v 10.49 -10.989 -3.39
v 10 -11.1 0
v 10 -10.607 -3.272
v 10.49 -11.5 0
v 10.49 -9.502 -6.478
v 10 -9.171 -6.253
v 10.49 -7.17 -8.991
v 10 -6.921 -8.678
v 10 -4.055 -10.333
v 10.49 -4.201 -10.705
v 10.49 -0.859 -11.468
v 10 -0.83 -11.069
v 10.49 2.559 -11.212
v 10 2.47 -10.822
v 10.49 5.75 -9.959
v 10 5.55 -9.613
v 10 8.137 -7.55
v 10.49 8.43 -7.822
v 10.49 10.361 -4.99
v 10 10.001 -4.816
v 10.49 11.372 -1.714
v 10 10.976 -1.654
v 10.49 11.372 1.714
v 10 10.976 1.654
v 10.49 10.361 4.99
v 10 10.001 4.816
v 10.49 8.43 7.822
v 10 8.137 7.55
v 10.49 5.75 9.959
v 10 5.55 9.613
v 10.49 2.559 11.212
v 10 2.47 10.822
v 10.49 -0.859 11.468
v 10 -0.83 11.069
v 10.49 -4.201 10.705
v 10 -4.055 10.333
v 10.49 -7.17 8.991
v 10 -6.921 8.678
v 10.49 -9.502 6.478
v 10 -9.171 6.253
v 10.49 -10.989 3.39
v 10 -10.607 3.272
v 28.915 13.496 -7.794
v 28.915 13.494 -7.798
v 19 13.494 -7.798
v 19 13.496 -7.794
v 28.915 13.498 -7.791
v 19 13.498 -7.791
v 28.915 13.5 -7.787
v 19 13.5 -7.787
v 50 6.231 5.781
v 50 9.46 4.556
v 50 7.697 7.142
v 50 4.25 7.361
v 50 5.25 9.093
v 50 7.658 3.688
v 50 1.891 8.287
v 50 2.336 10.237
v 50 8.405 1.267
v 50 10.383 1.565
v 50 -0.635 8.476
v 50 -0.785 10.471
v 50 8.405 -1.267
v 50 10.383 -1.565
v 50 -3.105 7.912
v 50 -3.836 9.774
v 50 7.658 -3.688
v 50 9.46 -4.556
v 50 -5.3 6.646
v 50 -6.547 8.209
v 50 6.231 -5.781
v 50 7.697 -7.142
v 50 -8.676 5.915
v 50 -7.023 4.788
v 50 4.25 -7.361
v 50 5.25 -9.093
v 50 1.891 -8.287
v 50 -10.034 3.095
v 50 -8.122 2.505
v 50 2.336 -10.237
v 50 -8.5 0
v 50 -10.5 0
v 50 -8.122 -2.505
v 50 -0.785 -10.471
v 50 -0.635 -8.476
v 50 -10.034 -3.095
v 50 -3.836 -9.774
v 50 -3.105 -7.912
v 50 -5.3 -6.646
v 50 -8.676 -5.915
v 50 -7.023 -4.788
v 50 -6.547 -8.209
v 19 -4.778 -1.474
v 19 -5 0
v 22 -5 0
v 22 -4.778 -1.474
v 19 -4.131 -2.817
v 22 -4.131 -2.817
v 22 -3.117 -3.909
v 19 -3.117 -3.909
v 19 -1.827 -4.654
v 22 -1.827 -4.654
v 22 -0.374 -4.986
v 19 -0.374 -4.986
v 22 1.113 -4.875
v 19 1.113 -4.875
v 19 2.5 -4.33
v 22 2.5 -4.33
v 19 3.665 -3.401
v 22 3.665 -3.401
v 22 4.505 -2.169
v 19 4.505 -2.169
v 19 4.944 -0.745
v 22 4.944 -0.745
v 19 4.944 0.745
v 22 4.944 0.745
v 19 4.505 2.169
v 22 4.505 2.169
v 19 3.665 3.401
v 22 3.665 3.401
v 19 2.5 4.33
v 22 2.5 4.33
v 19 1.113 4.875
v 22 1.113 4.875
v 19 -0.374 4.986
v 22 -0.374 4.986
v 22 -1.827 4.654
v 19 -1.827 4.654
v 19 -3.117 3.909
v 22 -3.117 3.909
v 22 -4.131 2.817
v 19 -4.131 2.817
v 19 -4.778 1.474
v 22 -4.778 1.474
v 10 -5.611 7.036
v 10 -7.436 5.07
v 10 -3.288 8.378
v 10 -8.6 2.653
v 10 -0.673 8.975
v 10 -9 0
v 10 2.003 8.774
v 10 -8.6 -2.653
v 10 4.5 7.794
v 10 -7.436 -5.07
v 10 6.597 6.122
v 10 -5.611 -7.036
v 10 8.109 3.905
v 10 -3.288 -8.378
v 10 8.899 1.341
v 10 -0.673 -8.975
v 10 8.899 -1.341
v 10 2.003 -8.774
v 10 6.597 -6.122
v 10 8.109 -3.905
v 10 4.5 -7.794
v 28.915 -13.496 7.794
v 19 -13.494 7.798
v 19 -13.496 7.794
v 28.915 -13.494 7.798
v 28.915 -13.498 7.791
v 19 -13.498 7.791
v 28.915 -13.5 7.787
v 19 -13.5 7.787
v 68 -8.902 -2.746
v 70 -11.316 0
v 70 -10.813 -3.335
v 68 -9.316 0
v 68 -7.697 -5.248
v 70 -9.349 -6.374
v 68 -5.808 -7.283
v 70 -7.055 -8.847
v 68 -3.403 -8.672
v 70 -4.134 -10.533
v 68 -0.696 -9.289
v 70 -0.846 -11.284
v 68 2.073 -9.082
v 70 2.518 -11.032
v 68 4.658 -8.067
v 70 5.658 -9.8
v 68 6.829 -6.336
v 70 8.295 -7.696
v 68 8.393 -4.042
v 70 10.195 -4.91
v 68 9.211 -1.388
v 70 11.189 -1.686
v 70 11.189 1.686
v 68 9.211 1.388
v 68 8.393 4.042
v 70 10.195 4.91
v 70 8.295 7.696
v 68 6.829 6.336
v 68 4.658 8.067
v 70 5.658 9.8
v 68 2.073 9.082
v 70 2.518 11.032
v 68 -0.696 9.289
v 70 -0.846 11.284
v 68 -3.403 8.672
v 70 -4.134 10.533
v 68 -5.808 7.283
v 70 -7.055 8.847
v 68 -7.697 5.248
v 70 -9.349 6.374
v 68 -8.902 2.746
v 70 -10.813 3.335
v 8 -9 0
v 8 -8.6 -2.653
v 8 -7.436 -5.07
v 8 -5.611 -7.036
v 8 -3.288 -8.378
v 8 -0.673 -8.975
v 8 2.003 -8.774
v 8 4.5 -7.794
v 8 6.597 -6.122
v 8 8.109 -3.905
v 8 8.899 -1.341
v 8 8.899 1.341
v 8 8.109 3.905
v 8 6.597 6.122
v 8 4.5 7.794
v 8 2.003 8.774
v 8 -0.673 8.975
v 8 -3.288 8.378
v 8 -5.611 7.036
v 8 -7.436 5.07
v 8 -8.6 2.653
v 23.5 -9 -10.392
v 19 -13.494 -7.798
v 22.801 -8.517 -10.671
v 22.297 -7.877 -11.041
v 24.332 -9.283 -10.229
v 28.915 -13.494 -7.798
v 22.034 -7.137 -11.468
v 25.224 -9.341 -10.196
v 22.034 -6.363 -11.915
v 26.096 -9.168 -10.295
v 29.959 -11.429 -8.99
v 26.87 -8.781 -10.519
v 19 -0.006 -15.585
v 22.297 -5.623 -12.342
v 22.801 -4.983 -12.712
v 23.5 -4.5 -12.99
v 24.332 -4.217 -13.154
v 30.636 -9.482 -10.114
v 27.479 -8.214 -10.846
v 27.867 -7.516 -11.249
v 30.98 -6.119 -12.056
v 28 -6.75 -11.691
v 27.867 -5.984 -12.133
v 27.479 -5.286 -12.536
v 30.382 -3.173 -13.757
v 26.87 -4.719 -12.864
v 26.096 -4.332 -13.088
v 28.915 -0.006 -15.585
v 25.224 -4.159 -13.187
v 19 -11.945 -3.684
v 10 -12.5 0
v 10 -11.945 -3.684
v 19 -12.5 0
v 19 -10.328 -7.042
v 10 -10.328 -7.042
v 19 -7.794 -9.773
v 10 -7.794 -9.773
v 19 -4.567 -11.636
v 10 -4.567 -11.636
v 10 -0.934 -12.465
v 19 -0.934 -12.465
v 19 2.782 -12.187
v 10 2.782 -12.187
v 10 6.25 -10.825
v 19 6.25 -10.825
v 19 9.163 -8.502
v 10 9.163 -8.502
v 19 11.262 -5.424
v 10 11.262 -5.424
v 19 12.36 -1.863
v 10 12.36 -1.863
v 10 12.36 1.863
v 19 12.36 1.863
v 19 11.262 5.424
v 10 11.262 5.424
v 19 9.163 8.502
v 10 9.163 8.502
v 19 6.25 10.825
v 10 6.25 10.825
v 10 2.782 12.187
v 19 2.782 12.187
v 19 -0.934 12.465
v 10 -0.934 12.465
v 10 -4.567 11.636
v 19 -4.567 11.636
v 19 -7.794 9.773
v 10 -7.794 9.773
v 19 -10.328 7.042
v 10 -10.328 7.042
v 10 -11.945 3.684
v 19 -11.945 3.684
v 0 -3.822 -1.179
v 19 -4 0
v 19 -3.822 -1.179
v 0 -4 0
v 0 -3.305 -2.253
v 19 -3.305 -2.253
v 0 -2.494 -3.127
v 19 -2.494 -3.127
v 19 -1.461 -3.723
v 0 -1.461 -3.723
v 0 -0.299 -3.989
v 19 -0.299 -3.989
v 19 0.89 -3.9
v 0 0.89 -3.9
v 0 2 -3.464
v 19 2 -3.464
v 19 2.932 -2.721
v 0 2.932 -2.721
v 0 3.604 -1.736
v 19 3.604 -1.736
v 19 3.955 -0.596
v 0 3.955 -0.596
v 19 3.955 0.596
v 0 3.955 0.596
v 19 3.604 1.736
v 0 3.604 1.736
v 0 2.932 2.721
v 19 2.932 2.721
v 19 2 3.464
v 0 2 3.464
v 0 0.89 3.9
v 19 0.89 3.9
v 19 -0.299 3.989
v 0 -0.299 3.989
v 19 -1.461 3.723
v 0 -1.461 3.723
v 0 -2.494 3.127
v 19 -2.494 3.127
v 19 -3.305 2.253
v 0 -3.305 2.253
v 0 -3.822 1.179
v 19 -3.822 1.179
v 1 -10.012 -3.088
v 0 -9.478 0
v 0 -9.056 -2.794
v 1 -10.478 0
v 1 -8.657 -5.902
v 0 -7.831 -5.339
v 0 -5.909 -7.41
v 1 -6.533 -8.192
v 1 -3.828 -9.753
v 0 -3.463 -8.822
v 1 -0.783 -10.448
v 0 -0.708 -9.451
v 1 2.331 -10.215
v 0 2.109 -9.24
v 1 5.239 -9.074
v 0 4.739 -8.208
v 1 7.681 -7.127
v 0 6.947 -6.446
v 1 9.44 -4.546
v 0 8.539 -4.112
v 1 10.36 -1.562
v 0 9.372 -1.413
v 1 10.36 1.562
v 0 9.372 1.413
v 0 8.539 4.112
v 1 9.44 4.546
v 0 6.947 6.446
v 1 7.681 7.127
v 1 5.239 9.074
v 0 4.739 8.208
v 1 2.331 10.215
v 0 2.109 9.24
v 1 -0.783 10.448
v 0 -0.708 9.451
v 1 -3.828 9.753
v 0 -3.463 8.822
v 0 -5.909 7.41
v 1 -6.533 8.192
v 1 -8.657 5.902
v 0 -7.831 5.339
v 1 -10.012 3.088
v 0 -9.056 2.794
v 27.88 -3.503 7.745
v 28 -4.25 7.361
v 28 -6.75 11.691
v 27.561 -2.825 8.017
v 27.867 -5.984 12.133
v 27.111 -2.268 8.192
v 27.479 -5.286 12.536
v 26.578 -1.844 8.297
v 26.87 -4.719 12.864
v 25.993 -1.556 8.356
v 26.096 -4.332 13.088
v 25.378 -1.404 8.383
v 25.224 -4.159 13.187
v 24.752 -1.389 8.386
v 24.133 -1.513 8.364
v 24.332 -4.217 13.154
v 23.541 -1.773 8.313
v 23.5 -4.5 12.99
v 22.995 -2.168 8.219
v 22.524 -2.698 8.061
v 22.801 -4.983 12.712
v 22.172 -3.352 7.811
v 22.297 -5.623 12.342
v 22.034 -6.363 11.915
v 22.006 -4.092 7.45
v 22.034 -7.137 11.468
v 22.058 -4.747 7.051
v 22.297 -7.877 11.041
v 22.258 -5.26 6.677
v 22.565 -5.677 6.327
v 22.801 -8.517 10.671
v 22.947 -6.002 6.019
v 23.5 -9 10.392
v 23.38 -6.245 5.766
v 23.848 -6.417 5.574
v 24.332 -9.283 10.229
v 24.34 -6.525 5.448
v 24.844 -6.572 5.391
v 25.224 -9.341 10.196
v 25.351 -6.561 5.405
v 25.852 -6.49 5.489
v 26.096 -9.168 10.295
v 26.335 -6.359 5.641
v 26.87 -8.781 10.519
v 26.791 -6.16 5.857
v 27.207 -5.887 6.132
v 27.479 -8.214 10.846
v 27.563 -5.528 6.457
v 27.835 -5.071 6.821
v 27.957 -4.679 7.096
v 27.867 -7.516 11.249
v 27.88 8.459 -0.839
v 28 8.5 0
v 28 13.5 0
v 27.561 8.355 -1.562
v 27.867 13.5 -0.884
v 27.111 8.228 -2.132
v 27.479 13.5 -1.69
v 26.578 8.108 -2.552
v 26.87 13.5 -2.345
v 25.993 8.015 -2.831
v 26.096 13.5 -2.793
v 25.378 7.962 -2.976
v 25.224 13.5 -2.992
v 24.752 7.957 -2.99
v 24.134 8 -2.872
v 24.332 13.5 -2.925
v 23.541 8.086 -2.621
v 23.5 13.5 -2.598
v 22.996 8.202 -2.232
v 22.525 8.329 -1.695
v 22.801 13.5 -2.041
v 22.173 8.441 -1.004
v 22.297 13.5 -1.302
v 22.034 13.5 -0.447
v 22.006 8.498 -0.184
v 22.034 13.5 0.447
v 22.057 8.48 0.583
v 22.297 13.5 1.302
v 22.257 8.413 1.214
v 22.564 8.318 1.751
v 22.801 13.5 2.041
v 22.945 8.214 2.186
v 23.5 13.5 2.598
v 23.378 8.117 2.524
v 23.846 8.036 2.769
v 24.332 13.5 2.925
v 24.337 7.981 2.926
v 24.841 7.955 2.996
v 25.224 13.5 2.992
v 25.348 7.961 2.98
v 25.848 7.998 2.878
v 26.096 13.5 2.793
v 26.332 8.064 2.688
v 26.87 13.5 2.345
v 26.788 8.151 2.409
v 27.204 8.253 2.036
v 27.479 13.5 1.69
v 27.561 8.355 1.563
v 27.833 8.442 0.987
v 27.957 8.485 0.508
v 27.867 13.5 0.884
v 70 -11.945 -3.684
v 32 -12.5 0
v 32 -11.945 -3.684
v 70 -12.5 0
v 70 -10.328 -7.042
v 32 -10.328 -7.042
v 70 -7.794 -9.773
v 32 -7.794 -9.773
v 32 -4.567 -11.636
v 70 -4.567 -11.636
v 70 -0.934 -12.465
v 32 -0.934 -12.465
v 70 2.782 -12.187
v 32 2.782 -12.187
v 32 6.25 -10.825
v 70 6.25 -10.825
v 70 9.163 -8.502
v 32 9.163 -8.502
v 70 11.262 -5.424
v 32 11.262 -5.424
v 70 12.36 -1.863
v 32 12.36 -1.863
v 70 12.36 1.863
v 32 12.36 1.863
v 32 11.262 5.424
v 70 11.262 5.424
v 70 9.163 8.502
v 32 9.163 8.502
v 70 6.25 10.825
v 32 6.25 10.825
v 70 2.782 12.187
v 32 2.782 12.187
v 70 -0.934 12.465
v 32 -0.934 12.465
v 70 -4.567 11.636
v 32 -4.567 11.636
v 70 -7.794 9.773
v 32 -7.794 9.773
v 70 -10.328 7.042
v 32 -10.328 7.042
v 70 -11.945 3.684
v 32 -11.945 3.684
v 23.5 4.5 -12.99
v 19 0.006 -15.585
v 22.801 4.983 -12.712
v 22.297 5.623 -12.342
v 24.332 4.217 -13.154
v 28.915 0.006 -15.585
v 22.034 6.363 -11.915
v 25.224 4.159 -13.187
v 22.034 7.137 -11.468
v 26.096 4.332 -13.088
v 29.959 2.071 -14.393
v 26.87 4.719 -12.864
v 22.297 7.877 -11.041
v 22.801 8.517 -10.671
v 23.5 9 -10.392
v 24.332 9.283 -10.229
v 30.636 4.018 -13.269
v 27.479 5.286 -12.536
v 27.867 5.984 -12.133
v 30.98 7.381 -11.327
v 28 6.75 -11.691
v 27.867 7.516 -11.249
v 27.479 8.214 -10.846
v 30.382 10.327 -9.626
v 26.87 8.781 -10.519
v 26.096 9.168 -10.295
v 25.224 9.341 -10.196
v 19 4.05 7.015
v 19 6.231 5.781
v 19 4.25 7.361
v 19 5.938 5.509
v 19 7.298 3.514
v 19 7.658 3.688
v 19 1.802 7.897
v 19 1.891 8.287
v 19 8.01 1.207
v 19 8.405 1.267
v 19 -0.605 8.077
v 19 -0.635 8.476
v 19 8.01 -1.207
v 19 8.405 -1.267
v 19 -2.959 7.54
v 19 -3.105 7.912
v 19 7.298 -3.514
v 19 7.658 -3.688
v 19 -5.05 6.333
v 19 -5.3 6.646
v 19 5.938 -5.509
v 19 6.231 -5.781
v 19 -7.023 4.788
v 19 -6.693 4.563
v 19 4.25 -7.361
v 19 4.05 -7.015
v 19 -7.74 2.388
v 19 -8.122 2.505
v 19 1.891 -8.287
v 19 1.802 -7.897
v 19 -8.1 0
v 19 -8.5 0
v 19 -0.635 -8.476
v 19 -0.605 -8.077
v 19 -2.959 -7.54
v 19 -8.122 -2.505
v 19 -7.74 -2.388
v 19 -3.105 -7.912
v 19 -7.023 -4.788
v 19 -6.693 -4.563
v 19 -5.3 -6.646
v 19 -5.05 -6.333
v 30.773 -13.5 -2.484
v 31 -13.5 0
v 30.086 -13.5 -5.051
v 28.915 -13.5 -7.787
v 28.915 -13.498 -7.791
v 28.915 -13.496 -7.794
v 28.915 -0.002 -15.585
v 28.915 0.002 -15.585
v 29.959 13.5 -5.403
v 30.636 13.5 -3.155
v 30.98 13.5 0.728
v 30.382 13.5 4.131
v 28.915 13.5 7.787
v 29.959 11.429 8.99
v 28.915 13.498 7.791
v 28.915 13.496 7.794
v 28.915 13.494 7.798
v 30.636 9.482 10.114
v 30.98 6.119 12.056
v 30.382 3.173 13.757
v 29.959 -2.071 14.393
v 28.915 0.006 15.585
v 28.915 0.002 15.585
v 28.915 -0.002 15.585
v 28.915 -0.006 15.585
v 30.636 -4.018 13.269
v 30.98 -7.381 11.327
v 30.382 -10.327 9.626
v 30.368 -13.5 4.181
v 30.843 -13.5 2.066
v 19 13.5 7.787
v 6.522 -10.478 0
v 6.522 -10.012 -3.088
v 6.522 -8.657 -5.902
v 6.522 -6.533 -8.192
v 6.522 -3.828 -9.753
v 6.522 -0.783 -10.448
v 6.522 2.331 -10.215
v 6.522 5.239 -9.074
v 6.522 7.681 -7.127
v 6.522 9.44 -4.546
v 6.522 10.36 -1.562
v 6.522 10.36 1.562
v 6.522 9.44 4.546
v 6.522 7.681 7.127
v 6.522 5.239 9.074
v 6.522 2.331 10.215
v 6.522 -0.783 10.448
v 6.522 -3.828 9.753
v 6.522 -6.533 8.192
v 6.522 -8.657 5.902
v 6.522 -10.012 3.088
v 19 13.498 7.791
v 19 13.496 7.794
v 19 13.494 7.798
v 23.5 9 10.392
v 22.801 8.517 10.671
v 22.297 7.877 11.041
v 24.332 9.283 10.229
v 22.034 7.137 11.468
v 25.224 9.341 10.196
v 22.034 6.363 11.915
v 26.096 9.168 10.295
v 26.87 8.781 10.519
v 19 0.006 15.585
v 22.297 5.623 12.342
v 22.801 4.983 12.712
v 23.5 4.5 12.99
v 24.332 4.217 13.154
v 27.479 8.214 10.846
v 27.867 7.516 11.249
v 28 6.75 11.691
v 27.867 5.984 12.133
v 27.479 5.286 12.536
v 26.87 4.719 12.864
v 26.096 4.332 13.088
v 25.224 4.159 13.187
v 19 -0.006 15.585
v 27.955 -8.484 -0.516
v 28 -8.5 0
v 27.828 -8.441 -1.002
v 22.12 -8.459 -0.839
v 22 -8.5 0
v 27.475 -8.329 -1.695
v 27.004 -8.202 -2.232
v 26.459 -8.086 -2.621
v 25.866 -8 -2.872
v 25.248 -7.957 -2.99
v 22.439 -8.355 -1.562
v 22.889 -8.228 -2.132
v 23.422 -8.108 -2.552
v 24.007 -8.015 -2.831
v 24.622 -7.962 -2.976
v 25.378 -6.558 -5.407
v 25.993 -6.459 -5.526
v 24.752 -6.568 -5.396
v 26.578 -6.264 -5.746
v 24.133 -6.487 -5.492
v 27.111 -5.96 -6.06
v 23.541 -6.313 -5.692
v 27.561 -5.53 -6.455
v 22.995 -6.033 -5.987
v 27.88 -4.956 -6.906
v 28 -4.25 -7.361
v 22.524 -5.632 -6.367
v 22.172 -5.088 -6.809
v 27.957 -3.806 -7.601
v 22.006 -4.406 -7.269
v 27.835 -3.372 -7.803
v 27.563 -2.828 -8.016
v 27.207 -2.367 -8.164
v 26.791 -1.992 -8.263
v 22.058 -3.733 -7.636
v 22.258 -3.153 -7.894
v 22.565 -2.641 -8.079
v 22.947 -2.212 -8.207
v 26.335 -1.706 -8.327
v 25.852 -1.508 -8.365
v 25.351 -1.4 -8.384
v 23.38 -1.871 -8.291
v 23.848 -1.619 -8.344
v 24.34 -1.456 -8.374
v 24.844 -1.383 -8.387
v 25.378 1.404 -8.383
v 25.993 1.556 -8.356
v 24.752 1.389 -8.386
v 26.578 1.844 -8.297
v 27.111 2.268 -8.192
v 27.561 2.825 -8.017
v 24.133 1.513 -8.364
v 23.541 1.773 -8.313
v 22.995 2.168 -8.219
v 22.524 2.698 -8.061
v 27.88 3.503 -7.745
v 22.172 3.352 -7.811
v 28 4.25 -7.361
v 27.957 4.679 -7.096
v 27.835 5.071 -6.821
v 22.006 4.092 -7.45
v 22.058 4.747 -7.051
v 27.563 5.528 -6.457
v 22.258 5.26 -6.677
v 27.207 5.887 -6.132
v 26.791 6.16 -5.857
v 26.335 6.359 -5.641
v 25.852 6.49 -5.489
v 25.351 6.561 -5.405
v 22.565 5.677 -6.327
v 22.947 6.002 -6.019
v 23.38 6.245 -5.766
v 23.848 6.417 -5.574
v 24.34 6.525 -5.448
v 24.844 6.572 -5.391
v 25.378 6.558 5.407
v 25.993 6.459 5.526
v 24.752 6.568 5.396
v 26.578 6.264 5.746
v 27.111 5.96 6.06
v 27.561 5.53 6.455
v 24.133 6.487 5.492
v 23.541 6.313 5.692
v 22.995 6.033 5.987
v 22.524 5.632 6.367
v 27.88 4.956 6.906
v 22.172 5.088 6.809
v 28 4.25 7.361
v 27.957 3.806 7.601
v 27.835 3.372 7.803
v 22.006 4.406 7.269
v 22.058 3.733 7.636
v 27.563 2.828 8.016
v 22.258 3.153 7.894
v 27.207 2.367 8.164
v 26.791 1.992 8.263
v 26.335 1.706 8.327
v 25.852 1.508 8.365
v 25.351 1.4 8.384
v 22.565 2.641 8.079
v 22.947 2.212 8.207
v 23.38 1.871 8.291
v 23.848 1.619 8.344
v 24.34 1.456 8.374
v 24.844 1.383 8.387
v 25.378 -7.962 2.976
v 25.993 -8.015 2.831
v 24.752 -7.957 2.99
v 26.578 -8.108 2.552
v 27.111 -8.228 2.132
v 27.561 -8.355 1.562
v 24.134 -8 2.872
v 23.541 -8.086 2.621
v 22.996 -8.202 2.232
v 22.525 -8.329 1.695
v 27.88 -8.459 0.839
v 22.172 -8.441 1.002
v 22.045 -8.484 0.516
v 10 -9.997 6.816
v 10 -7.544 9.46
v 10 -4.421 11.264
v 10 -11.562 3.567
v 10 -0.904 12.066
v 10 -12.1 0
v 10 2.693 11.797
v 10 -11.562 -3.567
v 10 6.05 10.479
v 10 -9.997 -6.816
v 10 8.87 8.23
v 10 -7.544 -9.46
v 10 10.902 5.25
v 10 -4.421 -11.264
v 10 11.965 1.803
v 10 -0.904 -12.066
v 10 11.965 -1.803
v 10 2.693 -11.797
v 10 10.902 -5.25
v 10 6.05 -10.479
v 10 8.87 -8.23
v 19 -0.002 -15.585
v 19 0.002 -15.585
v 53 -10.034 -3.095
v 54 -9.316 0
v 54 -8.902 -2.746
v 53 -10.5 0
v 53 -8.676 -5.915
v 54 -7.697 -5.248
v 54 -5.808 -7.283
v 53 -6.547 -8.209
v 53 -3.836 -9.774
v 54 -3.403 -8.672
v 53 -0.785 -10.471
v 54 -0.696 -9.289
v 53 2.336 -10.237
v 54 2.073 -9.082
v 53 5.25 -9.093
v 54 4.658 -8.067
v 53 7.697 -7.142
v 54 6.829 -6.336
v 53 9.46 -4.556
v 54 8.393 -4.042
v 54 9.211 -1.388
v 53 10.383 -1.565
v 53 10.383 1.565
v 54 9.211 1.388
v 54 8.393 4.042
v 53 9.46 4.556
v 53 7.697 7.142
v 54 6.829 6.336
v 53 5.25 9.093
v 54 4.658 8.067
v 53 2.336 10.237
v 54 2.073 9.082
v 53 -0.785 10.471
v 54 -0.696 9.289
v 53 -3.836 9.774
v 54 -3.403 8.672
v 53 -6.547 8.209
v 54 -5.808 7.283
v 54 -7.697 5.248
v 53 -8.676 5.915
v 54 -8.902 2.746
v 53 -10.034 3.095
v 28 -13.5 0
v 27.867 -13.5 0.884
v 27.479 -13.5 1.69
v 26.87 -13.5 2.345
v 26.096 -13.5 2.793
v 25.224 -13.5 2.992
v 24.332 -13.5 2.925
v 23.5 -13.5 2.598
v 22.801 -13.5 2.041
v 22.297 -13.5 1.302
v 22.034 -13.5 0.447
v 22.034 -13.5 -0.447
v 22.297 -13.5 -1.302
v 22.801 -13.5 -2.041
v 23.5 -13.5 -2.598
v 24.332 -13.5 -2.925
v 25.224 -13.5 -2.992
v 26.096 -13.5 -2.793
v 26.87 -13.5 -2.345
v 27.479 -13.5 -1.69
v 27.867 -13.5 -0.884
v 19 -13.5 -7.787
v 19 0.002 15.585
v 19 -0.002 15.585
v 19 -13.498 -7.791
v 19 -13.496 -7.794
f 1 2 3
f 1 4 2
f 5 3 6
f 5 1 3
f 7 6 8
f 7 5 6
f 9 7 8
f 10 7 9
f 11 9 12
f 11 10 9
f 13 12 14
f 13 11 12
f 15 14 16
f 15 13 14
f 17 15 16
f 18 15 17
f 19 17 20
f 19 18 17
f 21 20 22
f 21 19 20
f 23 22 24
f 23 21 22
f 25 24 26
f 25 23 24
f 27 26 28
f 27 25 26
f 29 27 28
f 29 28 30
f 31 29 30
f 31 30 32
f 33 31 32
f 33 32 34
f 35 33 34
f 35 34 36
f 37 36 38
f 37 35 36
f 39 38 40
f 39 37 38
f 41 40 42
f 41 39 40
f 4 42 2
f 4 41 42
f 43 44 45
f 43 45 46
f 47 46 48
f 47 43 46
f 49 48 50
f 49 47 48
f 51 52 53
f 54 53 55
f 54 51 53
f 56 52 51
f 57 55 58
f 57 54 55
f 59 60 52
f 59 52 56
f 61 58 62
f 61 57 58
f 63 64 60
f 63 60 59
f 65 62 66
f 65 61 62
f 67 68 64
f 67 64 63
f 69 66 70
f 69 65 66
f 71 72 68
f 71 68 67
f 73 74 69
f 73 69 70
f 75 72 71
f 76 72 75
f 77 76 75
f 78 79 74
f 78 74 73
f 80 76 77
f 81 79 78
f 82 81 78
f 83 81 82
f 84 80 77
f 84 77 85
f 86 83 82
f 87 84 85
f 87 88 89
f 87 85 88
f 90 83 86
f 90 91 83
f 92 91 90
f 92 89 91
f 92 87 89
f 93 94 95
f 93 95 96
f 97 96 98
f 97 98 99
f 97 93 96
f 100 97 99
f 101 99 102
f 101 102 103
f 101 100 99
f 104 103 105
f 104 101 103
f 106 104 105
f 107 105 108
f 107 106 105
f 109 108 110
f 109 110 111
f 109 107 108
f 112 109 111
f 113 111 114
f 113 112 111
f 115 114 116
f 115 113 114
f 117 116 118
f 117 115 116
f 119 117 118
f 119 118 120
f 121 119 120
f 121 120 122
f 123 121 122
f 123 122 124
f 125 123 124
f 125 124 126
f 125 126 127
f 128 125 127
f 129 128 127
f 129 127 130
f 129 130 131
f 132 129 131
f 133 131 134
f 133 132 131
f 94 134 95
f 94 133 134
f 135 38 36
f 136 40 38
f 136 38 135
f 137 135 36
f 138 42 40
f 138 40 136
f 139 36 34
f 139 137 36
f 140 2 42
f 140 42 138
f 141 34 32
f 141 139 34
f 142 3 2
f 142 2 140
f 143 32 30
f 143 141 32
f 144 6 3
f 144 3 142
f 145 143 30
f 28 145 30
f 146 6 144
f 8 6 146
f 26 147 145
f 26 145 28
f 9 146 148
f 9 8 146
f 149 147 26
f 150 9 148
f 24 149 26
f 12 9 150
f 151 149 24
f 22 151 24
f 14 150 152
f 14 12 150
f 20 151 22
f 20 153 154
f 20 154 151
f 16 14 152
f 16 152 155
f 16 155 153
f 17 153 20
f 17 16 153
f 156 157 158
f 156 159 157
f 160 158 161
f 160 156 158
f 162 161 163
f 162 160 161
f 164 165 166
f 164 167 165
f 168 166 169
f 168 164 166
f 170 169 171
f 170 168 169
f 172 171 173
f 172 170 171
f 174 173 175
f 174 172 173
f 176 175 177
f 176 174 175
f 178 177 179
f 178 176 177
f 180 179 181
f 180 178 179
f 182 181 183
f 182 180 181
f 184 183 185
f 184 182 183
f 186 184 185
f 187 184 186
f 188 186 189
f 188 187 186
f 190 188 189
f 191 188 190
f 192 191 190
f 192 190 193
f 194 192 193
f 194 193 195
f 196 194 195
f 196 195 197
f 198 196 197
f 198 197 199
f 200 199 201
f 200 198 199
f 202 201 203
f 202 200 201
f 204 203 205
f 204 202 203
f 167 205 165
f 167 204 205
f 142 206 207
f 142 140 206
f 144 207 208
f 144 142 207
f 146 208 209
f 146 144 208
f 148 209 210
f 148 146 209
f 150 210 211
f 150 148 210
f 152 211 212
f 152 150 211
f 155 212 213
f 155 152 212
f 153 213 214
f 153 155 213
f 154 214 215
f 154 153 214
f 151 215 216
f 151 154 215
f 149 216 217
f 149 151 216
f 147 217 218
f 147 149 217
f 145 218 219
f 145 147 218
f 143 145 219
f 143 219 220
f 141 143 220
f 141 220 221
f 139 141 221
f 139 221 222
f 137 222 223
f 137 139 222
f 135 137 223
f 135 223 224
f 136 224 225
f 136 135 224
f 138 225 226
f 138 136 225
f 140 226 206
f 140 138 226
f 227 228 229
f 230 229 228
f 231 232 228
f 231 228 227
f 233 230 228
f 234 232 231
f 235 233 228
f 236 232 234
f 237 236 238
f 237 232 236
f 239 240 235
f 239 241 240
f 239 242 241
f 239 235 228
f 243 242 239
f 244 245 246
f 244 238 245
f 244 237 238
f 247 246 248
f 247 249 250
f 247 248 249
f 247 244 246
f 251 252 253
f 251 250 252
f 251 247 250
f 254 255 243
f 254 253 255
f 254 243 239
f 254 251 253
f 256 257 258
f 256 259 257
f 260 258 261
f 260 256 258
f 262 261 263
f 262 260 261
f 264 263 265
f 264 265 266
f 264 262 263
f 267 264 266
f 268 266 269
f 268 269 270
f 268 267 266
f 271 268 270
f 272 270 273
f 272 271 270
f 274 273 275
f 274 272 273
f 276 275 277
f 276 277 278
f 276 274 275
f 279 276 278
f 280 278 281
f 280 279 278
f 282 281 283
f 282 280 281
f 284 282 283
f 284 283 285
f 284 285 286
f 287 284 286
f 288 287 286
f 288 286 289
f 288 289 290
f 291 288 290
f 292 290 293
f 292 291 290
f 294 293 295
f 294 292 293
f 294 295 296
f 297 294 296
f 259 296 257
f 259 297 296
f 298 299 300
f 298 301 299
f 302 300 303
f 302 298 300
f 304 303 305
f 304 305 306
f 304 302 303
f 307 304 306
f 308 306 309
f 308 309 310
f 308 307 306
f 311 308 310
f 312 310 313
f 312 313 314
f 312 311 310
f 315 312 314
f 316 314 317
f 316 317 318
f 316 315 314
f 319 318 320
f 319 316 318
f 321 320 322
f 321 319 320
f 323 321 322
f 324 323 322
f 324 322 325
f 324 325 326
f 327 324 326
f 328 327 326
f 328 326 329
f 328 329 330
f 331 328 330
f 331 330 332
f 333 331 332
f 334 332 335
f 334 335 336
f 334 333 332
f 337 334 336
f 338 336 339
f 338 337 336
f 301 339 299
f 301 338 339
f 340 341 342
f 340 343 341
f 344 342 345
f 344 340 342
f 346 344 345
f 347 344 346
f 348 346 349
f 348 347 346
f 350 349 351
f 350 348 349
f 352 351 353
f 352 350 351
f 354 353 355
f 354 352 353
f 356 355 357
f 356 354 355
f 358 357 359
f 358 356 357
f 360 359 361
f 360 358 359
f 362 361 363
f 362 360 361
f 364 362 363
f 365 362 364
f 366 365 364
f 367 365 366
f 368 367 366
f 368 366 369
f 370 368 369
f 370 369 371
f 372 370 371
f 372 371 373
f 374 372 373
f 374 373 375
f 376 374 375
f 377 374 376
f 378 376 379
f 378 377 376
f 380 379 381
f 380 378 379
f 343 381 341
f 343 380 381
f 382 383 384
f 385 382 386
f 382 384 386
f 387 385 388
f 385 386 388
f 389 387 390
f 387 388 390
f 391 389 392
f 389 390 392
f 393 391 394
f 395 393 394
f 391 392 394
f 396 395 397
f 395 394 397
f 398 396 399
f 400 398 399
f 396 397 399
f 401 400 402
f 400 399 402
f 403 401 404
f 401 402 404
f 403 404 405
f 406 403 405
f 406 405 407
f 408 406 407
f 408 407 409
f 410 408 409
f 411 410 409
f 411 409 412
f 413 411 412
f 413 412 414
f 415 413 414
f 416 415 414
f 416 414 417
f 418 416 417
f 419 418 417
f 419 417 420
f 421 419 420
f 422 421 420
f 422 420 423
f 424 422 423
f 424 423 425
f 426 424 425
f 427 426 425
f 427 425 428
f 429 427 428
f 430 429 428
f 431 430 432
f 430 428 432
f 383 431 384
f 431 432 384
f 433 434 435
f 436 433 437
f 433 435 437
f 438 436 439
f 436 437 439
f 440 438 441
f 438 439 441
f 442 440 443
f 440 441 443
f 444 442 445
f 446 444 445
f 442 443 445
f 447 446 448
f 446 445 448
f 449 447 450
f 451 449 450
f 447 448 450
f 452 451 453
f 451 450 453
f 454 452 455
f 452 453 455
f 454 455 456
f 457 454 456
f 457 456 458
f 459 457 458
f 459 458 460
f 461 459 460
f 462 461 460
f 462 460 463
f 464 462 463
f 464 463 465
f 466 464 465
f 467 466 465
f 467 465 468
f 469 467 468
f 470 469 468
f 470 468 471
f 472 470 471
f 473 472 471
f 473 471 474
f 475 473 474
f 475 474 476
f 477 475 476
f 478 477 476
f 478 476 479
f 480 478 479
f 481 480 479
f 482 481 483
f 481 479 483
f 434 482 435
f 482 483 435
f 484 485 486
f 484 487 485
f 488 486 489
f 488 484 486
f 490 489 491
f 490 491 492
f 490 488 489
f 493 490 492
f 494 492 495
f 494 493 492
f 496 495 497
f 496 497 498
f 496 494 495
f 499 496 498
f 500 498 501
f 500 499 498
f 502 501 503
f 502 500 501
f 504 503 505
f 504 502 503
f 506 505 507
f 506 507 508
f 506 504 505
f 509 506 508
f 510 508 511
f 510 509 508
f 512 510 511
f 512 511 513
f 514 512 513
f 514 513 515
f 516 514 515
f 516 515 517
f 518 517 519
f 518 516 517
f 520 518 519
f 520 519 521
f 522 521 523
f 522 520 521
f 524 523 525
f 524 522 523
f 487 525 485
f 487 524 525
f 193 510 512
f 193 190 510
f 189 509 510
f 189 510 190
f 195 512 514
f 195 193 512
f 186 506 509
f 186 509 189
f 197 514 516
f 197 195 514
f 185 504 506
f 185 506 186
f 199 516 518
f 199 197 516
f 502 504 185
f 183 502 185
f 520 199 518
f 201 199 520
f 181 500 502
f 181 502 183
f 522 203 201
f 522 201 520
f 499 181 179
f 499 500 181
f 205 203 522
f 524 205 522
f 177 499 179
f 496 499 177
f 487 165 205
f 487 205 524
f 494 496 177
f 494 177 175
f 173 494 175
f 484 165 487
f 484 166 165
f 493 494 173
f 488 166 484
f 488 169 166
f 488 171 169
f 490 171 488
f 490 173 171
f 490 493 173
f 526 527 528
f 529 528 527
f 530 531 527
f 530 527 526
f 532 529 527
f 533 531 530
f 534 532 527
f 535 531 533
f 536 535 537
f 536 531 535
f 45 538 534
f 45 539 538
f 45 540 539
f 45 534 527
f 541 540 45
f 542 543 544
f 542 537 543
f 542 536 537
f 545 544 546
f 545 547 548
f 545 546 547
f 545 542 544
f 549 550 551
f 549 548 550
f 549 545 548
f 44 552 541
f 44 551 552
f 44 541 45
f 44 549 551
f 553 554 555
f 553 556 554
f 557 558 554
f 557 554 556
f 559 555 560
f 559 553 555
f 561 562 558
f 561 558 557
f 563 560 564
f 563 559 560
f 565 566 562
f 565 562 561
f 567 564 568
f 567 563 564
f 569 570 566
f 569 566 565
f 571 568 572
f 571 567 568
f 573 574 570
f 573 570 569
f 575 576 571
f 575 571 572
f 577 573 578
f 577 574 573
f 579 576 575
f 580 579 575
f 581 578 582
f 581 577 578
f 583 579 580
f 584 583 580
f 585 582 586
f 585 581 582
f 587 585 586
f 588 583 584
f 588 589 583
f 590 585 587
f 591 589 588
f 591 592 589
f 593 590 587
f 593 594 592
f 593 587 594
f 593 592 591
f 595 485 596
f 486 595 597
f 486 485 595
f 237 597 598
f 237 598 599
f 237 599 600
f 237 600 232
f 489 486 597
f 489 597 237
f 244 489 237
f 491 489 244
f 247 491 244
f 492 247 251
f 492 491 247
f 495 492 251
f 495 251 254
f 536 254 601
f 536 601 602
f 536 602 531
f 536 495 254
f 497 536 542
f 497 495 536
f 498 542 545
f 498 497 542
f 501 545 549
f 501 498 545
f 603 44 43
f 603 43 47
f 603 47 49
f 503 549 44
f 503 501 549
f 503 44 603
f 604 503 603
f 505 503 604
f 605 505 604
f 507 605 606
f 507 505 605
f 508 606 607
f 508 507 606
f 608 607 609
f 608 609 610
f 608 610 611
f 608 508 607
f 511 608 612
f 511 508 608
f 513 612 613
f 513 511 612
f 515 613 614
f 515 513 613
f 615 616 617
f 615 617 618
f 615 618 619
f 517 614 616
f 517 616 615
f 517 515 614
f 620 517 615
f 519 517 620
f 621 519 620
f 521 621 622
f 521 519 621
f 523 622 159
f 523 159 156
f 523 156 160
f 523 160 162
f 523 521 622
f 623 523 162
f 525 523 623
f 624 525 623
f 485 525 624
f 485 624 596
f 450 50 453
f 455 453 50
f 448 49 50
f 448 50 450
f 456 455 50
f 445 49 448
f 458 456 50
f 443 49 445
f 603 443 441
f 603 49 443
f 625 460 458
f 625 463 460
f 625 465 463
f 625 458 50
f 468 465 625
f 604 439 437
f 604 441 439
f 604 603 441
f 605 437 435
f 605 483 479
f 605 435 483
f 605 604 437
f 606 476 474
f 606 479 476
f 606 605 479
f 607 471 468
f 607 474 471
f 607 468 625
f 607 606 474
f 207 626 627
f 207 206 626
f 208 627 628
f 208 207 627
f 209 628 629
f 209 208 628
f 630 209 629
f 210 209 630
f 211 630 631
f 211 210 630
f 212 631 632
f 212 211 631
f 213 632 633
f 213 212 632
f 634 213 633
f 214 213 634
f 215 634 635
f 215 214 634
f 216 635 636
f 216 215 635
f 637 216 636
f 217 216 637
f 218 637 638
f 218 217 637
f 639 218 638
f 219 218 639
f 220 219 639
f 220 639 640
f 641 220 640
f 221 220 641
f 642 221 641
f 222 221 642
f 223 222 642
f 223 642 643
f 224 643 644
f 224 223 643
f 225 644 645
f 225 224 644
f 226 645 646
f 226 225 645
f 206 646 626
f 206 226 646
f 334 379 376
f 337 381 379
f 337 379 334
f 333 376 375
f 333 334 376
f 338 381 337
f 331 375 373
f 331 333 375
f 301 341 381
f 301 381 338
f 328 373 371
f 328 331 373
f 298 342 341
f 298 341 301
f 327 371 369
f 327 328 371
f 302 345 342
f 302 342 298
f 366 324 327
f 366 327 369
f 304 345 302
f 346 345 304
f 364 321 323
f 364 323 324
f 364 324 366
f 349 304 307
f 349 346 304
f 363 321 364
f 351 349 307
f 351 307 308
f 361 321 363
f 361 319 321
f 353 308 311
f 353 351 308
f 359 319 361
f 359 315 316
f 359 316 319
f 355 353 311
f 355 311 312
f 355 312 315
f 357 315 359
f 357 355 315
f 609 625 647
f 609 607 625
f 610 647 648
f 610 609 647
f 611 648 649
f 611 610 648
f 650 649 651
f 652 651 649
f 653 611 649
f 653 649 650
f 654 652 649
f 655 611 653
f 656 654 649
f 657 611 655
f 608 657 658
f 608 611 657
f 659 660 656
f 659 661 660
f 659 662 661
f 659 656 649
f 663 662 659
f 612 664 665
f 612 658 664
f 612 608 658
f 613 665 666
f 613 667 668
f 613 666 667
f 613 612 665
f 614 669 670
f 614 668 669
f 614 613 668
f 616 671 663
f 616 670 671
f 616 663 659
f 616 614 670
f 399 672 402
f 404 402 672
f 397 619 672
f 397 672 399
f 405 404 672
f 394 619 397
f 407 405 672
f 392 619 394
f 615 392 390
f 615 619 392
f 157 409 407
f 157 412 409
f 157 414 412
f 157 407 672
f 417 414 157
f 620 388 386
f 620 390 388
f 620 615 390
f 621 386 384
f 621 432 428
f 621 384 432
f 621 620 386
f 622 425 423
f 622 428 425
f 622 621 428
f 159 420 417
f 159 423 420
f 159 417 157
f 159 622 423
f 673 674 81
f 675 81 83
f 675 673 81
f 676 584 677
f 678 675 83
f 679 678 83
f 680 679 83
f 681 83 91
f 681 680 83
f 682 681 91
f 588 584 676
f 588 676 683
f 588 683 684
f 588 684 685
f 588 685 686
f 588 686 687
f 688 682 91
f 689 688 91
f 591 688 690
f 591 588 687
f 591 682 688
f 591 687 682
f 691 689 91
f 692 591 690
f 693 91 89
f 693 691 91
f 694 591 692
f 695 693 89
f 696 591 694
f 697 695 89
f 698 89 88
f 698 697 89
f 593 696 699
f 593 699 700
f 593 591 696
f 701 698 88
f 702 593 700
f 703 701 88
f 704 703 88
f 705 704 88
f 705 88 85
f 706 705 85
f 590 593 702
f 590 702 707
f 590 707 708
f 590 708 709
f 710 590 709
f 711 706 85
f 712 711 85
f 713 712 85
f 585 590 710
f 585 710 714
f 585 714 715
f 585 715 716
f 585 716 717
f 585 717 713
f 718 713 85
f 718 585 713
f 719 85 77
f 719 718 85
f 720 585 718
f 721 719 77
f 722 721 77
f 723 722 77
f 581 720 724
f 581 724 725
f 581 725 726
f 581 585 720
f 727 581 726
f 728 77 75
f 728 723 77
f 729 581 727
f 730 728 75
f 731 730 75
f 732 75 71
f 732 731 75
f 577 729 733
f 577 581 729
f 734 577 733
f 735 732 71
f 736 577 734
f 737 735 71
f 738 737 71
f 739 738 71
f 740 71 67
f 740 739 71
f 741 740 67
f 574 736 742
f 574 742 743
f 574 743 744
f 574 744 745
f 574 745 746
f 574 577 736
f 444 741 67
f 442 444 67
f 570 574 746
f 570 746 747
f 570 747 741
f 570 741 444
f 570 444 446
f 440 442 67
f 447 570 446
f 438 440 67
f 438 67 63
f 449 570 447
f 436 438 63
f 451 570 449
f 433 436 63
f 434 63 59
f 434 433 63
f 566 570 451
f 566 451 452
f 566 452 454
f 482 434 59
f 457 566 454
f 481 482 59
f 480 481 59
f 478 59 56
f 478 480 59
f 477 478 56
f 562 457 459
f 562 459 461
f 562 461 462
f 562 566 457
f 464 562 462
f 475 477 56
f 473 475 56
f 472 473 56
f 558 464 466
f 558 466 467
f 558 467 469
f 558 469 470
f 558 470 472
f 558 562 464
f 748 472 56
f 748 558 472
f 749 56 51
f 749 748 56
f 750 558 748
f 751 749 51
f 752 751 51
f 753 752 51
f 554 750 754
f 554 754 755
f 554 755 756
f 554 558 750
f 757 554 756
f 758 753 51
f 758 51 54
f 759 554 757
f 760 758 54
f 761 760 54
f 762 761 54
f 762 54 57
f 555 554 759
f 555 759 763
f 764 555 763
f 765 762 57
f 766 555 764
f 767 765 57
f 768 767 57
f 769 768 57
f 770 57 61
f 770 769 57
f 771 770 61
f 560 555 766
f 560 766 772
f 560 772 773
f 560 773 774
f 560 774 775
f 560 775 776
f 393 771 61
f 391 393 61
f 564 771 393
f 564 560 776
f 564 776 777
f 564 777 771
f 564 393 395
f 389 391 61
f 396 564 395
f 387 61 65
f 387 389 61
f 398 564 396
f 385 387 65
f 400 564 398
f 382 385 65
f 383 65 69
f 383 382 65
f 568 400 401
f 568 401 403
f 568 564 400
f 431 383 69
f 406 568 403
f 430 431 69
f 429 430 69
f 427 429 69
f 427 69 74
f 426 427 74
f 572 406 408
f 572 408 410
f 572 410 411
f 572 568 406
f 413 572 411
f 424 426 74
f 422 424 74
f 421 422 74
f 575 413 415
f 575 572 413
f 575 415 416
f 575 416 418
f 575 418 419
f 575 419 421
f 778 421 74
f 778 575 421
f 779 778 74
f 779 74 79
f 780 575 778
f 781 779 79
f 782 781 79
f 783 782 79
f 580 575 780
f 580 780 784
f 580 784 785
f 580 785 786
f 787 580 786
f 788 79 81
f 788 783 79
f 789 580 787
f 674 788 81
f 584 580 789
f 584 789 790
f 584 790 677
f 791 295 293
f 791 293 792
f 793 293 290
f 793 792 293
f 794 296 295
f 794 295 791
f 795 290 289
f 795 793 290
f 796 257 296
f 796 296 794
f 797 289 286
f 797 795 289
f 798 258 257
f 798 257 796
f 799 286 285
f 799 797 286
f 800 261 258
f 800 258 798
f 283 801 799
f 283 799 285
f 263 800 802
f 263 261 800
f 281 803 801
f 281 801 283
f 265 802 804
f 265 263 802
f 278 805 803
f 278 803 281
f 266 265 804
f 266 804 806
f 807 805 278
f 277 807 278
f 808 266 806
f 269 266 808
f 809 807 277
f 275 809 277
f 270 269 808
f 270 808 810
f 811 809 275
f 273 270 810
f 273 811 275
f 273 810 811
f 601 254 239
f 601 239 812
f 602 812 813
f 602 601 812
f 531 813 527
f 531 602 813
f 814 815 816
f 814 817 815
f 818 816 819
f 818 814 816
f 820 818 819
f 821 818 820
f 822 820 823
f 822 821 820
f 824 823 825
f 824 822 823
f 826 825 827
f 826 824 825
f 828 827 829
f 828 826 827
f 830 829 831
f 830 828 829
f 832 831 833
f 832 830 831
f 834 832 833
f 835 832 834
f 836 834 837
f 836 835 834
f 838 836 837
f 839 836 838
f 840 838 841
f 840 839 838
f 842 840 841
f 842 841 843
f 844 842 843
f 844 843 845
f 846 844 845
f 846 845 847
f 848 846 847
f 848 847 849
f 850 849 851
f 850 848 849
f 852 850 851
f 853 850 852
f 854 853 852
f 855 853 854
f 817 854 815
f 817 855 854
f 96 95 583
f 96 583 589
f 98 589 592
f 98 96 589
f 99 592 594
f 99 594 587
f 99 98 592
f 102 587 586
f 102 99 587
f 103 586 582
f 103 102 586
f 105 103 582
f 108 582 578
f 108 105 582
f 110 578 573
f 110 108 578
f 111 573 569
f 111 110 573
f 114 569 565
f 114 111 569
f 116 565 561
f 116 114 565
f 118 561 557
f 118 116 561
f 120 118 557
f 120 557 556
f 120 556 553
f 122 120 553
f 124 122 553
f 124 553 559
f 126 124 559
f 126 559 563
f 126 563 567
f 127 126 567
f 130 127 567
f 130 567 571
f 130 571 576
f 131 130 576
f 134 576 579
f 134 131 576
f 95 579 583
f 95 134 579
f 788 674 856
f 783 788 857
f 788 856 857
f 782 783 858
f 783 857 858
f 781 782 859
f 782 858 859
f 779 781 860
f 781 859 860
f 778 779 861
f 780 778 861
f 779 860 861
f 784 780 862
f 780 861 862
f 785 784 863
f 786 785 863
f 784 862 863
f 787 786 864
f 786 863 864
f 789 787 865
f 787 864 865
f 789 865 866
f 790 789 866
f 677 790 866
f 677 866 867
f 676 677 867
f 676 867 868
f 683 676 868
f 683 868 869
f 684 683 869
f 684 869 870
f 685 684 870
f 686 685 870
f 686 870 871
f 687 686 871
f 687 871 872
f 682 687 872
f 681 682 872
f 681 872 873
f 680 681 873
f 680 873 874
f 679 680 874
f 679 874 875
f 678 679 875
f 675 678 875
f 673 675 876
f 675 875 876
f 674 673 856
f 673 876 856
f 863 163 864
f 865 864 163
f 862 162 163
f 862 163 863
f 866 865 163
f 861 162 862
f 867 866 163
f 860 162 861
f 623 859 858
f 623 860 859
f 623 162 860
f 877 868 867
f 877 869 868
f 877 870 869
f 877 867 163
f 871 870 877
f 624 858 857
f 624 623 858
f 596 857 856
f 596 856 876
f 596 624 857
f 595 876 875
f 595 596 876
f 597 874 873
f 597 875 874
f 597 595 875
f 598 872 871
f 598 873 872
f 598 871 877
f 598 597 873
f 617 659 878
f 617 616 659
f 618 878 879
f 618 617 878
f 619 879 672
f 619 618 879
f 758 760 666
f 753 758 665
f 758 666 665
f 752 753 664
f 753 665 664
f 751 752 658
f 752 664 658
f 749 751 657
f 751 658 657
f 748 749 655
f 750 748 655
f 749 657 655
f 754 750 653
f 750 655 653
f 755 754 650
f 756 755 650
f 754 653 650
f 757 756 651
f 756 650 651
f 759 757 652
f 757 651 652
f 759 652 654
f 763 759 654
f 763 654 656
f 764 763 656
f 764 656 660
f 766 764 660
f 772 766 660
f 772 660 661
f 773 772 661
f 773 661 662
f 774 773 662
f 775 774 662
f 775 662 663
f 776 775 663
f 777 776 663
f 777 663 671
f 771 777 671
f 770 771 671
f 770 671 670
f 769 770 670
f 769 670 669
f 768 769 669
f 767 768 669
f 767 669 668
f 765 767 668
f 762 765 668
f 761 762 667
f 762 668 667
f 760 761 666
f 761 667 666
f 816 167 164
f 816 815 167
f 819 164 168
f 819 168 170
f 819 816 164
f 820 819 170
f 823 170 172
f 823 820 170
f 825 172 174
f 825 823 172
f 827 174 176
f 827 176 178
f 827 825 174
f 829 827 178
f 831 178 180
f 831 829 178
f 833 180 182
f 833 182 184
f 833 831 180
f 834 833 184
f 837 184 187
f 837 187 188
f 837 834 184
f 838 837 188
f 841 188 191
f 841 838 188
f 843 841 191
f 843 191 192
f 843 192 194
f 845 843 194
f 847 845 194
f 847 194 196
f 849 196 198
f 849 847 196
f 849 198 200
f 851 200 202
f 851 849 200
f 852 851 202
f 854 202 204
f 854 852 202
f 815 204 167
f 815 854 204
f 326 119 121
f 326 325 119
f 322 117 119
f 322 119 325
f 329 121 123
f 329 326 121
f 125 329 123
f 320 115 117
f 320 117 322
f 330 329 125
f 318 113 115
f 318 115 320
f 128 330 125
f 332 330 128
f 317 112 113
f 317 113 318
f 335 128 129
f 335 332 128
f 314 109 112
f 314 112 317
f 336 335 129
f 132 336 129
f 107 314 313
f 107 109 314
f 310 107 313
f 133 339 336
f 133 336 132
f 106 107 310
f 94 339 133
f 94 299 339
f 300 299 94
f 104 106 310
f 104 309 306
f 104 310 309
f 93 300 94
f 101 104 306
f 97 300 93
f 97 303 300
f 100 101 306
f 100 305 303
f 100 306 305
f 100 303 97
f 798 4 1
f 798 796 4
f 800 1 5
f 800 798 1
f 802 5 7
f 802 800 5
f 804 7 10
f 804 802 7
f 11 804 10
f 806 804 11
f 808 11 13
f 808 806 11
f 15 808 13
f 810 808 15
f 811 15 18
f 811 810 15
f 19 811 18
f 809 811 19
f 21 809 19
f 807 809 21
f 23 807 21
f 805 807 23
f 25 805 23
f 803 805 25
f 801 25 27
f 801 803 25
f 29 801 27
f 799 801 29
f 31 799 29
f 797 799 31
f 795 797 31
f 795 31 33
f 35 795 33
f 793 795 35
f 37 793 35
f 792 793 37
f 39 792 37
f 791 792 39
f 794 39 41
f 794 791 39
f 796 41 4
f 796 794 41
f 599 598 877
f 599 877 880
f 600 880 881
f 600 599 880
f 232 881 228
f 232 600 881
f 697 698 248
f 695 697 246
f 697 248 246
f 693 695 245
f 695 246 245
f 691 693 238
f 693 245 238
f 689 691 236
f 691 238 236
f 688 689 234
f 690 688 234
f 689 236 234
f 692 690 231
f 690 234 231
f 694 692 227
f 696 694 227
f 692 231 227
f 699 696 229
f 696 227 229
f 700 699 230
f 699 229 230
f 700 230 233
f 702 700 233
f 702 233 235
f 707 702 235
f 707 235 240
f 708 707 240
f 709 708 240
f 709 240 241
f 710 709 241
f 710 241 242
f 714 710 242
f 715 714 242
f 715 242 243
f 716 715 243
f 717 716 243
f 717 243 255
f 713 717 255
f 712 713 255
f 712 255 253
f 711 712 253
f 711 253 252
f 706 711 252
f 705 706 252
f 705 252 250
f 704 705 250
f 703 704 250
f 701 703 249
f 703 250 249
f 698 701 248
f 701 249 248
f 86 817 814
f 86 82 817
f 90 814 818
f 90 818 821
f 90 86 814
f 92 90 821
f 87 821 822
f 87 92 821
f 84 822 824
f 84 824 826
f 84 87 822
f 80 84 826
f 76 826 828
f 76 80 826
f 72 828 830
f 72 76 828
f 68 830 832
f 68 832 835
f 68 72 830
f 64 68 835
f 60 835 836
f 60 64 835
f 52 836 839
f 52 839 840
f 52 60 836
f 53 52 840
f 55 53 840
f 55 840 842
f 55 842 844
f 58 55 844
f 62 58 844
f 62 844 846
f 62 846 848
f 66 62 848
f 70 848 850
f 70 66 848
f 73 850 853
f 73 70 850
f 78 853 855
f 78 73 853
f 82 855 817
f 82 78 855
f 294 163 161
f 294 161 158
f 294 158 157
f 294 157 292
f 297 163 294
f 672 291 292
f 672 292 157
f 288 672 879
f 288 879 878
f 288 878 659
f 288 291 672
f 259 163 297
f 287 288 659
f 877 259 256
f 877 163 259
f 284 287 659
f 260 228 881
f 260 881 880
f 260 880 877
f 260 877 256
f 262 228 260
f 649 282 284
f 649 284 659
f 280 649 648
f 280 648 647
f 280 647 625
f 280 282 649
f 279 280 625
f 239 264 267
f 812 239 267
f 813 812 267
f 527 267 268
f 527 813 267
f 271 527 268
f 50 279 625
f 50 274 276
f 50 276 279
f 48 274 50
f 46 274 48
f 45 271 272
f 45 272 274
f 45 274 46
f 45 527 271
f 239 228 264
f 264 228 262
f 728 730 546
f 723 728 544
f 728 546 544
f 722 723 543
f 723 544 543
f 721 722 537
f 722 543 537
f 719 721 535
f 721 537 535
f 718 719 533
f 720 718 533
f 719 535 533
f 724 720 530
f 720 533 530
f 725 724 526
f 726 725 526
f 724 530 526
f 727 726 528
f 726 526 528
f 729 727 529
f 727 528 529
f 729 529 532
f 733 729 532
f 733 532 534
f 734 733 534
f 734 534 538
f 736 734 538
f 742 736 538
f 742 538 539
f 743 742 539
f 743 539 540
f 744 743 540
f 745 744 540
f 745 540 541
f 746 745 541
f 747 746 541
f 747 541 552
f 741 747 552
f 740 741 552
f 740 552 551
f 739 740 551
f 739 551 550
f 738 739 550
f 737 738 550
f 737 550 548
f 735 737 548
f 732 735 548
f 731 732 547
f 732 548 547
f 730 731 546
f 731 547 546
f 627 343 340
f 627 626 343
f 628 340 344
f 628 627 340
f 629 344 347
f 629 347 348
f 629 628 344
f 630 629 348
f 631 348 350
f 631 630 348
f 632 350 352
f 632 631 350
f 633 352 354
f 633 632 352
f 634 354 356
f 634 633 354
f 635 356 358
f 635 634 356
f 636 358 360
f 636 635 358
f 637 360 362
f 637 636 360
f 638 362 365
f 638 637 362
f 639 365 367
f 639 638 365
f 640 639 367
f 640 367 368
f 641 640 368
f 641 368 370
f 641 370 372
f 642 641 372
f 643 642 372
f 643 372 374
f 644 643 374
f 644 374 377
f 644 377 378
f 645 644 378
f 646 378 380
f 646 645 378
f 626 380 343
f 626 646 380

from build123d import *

# Parameters (mm, degrees)
WYTNIJ_WYCI_GNI_CIE1_START = -52
WYTNIJ_WYCI_GNI_CIE1_DEPTH = 72
SZKIC3_R                   = 3
WYTNIJ_WYCI_GNI_CIE2_DEPTH = 12
SZYK_KO_OWY1_COUNT         = 6


with BuildPart() as part:
    # Szkic1 → Obrót1 (revolve)
    with BuildSketch(Plane.XY):
        Polygon((0, -4), (0, -9.4775), (1, -10.4775), (6.5225, -10.4775), (8, -9), (10, -9), (10, -11.1), (10.489897949, -11.5), (10, -12.1), (10, -12.5), (19, -12.5), (19, -15.585), (28.915, -15.585), (32, -12.5), (70, -12.5), (70, -11.3155), (68, -9.3155), (54, -9.3155), (53, -10.5), (50, -10.5), (50, -8.5), (19, -8.5), (19, -8.1), (22, -5), (19, -5), (19, -4), align=None)
    revolve(axis=Axis((0, 0, 0), (1, 0, 0)))

    # Szkic2 → Wytnij-wyciągnięcie1 (cut)
    with BuildSketch(Plane.ZY.offset(-19).offset(WYTNIJ_WYCI_GNI_CIE1_START)):
        Polygon((-92.411763114, 13.5), (-7.787311795, 13.5), (7.787311795, 13.5), (92.411763114, 13.5), (92.411763114, 182.748902638), (-92.411763114, 182.748902638), align=None)
    wytnij_wyci_gni_cie1 = extrude(amount=WYTNIJ_WYCI_GNI_CIE1_DEPTH, mode=Mode.SUBTRACT)

    # Szkic3 → Wytnij-wyciągnięcie2 (cut)
    with BuildSketch(Plane(origin=(0, 13.5, 0), x_dir=(1, 0, 0), z_dir=(0, 1, 0))):
        with Locations((25, 0)):
            Circle(SZKIC3_R)
    wytnij_wyci_gni_cie2 = extrude(amount=-WYTNIJ_WYCI_GNI_CIE2_DEPTH, mode=Mode.SUBTRACT)

    # Szyk kołowy1: Wytnij-wyciągnięcie1, Wytnij-wyciągnięcie2 ×6 about axis
    szyk_ko_owy1_axis = Axis((0, 0, 0), (-1, 0, 0))
    for i in range(1, SZYK_KO_OWY1_COUNT):
        add(wytnij_wyci_gni_cie1.rotate(szyk_ko_owy1_axis, i * 360 / SZYK_KO_OWY1_COUNT), mode=Mode.SUBTRACT)
        add(wytnij_wyci_gni_cie2.rotate(szyk_ko_owy1_axis, i * 360 / SZYK_KO_OWY1_COUNT), mode=Mode.SUBTRACT)


solid = part.part
